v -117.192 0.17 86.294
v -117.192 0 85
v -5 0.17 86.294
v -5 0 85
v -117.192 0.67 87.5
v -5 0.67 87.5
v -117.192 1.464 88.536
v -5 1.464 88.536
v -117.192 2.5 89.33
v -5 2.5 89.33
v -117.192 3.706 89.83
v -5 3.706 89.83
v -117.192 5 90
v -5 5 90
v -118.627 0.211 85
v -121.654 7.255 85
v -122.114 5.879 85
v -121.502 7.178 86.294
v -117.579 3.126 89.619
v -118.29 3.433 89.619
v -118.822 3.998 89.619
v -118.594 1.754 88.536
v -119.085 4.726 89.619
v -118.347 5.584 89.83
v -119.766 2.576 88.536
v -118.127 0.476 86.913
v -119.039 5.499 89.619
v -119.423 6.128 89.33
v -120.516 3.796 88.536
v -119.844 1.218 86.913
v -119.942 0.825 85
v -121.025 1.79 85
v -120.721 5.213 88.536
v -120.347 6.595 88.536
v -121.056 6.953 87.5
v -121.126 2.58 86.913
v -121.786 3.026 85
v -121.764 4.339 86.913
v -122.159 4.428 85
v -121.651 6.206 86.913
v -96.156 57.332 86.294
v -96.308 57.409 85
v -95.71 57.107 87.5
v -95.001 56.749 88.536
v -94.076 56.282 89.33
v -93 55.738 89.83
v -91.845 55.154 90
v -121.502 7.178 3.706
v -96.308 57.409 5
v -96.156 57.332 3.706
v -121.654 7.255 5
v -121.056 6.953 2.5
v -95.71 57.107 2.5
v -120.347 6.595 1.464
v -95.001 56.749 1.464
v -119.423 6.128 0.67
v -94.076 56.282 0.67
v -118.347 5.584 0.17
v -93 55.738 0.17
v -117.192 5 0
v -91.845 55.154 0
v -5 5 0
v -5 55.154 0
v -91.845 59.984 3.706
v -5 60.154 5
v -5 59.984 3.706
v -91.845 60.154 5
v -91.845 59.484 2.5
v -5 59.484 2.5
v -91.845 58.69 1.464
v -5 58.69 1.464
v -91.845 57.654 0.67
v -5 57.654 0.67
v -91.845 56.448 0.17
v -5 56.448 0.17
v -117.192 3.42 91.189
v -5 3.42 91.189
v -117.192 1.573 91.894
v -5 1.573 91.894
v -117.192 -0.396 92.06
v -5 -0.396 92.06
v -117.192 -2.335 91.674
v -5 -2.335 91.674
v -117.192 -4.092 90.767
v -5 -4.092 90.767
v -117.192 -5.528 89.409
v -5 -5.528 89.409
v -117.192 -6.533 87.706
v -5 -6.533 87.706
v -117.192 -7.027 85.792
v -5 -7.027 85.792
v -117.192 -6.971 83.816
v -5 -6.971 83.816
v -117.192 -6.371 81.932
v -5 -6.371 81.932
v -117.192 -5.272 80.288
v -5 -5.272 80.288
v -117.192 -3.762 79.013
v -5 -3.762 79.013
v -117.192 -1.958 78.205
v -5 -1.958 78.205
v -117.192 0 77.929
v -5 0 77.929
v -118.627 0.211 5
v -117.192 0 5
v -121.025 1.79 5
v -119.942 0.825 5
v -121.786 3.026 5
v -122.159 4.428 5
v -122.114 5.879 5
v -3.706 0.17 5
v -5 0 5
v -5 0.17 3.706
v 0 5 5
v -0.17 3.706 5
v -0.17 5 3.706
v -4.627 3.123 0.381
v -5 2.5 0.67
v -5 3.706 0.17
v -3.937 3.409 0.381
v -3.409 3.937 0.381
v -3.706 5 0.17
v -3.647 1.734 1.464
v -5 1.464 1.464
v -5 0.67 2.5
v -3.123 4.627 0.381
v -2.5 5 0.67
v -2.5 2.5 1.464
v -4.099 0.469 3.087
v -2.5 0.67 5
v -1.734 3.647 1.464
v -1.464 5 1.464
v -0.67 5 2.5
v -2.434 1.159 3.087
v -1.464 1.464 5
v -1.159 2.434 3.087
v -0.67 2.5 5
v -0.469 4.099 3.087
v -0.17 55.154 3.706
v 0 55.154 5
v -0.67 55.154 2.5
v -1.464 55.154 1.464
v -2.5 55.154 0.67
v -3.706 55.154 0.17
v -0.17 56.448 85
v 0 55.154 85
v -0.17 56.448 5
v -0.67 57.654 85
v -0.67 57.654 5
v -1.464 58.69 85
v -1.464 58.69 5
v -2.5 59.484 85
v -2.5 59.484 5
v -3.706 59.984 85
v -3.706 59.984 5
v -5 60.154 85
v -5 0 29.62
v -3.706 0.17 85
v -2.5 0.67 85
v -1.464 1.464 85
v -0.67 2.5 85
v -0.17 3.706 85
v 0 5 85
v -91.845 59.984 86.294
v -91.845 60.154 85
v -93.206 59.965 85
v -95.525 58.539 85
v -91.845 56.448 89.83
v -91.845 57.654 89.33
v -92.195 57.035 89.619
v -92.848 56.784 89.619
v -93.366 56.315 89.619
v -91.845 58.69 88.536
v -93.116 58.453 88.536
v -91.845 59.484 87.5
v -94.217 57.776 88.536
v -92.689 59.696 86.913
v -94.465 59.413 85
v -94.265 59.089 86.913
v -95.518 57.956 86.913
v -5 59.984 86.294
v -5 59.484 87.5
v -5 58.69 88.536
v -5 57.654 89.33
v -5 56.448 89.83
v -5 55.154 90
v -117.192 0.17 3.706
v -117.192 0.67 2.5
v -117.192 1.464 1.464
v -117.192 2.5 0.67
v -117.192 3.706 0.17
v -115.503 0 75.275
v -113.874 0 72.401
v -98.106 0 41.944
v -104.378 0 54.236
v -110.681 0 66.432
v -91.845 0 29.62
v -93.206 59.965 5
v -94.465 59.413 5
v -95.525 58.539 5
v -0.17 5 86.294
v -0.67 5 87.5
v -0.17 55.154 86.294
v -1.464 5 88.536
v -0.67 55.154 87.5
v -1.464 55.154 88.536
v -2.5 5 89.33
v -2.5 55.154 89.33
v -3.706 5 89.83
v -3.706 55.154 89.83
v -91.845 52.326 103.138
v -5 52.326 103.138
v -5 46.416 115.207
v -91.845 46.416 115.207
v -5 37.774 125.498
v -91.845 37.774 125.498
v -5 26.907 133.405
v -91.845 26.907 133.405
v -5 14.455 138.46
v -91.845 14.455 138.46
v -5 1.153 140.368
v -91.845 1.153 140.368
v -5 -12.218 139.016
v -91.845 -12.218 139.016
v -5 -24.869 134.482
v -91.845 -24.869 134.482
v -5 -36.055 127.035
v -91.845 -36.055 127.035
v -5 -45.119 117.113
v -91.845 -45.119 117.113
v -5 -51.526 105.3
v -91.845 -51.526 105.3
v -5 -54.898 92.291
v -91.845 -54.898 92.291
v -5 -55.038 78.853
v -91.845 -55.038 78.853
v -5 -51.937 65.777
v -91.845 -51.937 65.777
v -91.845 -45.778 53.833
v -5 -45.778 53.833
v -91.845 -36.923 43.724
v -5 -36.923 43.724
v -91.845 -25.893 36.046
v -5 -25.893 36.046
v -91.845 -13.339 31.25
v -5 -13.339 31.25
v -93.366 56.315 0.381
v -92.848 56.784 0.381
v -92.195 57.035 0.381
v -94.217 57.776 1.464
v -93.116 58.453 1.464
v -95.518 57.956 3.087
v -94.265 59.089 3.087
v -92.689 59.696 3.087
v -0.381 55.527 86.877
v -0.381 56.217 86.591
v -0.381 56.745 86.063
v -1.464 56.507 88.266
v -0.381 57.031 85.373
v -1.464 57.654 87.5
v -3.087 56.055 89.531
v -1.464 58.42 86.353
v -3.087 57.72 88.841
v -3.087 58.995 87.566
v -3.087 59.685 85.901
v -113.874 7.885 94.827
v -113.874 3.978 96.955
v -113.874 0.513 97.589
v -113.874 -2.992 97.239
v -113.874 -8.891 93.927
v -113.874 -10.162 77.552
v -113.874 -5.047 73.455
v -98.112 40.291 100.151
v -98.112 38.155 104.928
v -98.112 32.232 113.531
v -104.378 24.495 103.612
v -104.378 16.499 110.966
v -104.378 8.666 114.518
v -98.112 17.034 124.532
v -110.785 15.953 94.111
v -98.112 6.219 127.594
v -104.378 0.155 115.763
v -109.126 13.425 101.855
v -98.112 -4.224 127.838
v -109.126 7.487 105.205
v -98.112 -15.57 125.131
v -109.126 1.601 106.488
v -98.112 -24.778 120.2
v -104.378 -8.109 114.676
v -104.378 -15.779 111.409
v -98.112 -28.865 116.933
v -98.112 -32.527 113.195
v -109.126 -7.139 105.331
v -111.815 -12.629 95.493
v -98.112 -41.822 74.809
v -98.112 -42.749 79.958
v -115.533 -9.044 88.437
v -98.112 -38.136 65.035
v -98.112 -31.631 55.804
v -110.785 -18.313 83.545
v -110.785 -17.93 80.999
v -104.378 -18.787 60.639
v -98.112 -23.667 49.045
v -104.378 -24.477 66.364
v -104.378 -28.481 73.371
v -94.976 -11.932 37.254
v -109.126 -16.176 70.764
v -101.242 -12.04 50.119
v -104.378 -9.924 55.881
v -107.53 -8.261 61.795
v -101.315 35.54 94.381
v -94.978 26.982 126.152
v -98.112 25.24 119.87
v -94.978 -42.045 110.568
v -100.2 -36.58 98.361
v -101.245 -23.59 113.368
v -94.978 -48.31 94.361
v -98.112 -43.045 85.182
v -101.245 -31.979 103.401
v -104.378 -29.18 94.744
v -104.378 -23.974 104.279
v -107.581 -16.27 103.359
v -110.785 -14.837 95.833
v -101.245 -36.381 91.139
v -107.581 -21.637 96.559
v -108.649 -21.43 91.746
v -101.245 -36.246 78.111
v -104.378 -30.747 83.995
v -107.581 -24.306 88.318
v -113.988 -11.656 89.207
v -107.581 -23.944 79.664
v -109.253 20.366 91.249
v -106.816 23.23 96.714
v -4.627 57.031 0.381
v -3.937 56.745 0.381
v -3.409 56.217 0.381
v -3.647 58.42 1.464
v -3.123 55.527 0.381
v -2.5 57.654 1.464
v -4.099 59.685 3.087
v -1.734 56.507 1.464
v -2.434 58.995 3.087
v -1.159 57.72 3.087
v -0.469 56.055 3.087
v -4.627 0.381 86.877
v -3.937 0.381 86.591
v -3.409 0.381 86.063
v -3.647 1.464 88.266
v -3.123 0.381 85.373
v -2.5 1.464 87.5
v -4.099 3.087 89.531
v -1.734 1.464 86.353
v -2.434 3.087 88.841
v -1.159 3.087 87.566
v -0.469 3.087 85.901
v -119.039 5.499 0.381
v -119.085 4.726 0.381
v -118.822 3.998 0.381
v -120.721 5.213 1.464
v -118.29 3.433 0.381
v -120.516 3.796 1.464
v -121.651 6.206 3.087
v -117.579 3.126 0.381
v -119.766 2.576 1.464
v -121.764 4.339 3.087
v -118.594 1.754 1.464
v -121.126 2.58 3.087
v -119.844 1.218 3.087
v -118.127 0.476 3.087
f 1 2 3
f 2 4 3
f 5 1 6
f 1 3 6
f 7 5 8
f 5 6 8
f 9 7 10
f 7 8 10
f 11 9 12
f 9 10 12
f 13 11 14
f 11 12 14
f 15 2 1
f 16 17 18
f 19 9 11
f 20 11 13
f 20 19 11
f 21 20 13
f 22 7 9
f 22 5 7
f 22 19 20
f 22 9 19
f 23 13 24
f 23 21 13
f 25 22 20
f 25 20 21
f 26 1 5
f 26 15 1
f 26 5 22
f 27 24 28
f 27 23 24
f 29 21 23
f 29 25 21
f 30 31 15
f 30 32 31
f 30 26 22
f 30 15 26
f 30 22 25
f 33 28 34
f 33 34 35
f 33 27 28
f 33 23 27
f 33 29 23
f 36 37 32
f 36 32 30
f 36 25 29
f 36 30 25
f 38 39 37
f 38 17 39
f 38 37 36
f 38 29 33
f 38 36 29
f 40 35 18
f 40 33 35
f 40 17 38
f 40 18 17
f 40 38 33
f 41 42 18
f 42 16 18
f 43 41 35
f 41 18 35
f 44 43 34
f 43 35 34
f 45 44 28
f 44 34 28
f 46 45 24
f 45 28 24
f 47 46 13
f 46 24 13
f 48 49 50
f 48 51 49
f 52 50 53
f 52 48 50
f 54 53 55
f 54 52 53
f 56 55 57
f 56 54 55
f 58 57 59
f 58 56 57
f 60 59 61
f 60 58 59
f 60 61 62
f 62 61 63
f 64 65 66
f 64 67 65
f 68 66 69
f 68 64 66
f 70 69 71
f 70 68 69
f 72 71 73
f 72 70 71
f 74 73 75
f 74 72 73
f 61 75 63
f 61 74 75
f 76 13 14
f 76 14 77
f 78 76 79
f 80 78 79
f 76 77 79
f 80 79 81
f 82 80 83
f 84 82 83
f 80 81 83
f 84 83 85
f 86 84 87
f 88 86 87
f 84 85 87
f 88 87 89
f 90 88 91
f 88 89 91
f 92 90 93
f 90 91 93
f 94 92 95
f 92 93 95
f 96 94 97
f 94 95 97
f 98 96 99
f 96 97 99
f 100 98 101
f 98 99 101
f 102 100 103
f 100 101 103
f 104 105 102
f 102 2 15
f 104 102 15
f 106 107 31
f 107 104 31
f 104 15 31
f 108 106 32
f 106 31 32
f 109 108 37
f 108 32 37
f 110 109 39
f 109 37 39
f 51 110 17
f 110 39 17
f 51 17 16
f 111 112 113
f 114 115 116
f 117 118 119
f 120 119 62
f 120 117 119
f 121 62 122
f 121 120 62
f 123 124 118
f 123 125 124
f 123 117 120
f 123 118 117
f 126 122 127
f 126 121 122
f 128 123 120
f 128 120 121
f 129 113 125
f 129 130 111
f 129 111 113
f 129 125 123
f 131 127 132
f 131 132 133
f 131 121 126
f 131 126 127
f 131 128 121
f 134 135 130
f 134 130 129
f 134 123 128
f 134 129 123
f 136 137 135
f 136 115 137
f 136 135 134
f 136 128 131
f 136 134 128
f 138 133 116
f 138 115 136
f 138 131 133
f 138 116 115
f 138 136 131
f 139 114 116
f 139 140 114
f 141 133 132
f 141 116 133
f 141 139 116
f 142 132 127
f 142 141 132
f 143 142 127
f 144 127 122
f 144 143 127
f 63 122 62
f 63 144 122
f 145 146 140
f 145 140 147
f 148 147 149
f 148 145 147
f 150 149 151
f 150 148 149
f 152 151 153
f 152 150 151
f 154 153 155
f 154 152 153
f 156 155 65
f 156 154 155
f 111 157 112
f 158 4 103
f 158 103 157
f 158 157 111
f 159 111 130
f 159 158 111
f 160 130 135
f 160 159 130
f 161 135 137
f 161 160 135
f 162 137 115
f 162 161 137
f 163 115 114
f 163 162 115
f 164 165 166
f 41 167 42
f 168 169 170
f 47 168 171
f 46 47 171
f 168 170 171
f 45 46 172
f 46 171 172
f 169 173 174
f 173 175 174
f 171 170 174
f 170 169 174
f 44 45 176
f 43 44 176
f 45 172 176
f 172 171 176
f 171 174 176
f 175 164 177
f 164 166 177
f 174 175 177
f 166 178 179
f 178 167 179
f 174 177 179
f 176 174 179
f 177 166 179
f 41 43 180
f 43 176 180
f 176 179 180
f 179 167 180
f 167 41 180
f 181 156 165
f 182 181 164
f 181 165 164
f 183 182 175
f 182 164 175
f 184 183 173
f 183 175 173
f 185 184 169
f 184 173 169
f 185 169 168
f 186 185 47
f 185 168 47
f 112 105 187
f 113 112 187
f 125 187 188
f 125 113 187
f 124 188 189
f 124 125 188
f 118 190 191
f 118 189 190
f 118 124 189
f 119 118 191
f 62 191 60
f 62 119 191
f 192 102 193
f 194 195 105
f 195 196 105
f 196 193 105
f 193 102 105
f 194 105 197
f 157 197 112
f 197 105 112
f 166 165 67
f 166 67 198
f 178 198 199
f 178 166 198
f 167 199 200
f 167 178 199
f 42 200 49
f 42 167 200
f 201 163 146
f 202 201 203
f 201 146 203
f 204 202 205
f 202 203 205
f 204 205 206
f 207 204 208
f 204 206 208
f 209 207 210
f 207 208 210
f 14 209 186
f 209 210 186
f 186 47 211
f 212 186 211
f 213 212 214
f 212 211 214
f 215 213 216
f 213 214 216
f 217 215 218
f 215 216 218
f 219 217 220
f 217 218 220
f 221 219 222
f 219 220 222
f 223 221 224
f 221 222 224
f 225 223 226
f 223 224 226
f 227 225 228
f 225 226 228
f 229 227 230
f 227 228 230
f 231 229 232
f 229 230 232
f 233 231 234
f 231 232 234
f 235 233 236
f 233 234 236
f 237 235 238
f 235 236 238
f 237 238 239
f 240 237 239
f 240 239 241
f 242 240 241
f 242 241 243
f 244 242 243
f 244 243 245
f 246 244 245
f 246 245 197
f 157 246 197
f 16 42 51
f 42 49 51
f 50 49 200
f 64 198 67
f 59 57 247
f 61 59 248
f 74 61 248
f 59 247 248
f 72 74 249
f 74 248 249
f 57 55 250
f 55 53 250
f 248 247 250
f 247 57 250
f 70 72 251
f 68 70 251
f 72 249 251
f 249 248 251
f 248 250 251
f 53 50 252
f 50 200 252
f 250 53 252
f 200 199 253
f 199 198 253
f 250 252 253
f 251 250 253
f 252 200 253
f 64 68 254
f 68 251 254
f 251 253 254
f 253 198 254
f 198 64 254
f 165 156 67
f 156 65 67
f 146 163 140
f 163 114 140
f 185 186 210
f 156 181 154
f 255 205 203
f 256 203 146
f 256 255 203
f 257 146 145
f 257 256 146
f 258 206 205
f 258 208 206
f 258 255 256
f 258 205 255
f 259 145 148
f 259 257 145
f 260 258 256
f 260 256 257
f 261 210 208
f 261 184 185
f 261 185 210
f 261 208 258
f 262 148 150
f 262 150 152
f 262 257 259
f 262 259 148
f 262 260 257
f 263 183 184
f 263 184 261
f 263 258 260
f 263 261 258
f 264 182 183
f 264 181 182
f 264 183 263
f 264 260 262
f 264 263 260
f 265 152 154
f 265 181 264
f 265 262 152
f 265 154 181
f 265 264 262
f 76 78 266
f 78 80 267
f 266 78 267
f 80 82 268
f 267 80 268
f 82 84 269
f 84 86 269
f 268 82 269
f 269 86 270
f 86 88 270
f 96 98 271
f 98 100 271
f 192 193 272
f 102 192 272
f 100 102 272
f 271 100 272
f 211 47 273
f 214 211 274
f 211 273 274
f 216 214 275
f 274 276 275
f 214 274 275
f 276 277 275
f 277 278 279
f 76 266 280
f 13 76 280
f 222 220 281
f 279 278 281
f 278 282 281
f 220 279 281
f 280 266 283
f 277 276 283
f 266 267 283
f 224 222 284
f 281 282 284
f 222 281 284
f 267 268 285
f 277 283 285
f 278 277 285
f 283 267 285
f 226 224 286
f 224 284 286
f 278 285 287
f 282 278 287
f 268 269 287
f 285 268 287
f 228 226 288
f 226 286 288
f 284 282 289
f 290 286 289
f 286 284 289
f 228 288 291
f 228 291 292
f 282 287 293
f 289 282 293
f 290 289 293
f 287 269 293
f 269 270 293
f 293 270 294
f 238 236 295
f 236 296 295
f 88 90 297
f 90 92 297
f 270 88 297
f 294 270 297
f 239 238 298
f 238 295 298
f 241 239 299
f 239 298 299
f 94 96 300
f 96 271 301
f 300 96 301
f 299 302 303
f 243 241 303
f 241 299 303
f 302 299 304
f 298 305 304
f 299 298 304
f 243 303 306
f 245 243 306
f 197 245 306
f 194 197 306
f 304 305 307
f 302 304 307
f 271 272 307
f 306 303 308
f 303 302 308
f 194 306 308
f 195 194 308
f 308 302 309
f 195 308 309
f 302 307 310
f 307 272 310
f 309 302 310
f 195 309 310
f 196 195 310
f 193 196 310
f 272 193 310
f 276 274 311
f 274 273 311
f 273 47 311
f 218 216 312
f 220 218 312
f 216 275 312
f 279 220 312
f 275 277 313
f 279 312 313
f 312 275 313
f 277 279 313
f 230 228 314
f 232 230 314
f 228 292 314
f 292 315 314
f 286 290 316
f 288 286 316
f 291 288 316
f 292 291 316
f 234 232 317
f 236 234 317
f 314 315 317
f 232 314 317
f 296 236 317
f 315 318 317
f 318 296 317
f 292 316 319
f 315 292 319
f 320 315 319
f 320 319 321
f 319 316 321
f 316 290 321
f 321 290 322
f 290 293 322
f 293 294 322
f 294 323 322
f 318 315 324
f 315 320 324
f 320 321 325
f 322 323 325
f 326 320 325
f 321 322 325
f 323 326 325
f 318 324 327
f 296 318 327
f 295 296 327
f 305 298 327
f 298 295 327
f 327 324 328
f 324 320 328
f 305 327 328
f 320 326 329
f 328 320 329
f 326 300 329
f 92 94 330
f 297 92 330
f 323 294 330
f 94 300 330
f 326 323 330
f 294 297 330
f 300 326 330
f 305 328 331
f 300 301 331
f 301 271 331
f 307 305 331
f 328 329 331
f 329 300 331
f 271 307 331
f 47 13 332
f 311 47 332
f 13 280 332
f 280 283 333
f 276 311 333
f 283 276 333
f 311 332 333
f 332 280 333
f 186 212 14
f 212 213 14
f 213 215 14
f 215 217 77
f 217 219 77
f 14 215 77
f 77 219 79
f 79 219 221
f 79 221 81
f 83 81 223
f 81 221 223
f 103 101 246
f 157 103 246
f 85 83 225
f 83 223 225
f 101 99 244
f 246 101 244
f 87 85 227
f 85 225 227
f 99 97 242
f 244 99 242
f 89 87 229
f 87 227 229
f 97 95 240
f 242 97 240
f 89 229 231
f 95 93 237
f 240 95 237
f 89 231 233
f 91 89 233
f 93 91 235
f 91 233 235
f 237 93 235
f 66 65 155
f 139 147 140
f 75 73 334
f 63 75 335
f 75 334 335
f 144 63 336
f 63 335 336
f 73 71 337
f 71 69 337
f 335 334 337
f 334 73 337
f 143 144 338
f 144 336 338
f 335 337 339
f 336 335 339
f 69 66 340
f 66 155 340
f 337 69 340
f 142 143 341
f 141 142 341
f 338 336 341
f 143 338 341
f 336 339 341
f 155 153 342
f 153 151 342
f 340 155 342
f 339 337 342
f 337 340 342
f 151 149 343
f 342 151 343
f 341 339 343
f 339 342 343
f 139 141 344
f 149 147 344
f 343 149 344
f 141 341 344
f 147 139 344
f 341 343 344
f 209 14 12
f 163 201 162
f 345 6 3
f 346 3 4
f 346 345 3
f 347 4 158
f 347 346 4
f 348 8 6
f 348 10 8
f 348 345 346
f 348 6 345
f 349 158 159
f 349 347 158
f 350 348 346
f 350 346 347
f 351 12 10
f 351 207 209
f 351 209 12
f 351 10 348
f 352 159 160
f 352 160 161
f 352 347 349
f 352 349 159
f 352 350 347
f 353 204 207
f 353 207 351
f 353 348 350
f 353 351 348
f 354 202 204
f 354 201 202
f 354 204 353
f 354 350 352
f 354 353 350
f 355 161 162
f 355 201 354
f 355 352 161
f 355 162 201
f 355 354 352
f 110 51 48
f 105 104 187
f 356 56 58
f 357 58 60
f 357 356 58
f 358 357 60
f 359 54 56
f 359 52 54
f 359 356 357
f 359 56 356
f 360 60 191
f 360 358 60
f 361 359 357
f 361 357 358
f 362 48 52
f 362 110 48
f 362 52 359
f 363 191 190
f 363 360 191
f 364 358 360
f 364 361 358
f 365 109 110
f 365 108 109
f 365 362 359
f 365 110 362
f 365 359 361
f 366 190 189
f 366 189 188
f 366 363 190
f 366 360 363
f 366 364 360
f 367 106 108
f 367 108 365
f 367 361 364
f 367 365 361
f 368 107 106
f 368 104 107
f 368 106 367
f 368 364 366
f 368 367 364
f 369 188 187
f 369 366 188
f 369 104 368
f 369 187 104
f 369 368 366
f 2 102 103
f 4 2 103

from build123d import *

# Parameters (mm, degrees)
F1_DEPTH = 90
F2_R     = 5


with BuildPart() as f1:
    # F0 (on Top) → F1 (new body)
    with BuildSketch(Plane.XY):
        Polygon((-125.3208518028, 0), (0, 0), (0, 60.1540058851), (-94.9204340577, 60.1540058851), align=None)
    extrude(amount=F1_DEPTH)

    # F2
    f2_edges = [f1.edges().sort_by_distance(p)[0] for p in [
        (-47.460217, 60.154006, 90),
        (0, 30.077003, 90),
        (-62.660426, 0, 90),
        (-110.120643, 30.077003, 90),
        (0, 60.154006, 45),
        (0, 0, 45),
        (-94.920434, 60.154006, 45),
        (-125.320852, 0, 45),
        (-110.120643, 30.077003, 0),
        (-62.660426, 0, 0),
        (-47.460217, 60.154006, 0),
        (0, 30.077003, 0),
    ]]
    fillet(f2_edges, radius=F2_R)

    # F1_face (on face) → F3 (revolve)
    with BuildSketch(Plane(origin=(-55.0281837539, 29.0125128526, 90), x_dir=(1, 0, 0), z_dir=(0, 0, 1))):
        Polygon((50.0281837539, 26.1414930325), (-36.8168888954, 26.1414930325), (-62.1635421741, -24.0125128526), (50.0281837539, -24.0125128526), align=None)
    revolve(axis=Axis((-61.095862964, 0, 85), (1, 0, 0)))


solid = f1.part
